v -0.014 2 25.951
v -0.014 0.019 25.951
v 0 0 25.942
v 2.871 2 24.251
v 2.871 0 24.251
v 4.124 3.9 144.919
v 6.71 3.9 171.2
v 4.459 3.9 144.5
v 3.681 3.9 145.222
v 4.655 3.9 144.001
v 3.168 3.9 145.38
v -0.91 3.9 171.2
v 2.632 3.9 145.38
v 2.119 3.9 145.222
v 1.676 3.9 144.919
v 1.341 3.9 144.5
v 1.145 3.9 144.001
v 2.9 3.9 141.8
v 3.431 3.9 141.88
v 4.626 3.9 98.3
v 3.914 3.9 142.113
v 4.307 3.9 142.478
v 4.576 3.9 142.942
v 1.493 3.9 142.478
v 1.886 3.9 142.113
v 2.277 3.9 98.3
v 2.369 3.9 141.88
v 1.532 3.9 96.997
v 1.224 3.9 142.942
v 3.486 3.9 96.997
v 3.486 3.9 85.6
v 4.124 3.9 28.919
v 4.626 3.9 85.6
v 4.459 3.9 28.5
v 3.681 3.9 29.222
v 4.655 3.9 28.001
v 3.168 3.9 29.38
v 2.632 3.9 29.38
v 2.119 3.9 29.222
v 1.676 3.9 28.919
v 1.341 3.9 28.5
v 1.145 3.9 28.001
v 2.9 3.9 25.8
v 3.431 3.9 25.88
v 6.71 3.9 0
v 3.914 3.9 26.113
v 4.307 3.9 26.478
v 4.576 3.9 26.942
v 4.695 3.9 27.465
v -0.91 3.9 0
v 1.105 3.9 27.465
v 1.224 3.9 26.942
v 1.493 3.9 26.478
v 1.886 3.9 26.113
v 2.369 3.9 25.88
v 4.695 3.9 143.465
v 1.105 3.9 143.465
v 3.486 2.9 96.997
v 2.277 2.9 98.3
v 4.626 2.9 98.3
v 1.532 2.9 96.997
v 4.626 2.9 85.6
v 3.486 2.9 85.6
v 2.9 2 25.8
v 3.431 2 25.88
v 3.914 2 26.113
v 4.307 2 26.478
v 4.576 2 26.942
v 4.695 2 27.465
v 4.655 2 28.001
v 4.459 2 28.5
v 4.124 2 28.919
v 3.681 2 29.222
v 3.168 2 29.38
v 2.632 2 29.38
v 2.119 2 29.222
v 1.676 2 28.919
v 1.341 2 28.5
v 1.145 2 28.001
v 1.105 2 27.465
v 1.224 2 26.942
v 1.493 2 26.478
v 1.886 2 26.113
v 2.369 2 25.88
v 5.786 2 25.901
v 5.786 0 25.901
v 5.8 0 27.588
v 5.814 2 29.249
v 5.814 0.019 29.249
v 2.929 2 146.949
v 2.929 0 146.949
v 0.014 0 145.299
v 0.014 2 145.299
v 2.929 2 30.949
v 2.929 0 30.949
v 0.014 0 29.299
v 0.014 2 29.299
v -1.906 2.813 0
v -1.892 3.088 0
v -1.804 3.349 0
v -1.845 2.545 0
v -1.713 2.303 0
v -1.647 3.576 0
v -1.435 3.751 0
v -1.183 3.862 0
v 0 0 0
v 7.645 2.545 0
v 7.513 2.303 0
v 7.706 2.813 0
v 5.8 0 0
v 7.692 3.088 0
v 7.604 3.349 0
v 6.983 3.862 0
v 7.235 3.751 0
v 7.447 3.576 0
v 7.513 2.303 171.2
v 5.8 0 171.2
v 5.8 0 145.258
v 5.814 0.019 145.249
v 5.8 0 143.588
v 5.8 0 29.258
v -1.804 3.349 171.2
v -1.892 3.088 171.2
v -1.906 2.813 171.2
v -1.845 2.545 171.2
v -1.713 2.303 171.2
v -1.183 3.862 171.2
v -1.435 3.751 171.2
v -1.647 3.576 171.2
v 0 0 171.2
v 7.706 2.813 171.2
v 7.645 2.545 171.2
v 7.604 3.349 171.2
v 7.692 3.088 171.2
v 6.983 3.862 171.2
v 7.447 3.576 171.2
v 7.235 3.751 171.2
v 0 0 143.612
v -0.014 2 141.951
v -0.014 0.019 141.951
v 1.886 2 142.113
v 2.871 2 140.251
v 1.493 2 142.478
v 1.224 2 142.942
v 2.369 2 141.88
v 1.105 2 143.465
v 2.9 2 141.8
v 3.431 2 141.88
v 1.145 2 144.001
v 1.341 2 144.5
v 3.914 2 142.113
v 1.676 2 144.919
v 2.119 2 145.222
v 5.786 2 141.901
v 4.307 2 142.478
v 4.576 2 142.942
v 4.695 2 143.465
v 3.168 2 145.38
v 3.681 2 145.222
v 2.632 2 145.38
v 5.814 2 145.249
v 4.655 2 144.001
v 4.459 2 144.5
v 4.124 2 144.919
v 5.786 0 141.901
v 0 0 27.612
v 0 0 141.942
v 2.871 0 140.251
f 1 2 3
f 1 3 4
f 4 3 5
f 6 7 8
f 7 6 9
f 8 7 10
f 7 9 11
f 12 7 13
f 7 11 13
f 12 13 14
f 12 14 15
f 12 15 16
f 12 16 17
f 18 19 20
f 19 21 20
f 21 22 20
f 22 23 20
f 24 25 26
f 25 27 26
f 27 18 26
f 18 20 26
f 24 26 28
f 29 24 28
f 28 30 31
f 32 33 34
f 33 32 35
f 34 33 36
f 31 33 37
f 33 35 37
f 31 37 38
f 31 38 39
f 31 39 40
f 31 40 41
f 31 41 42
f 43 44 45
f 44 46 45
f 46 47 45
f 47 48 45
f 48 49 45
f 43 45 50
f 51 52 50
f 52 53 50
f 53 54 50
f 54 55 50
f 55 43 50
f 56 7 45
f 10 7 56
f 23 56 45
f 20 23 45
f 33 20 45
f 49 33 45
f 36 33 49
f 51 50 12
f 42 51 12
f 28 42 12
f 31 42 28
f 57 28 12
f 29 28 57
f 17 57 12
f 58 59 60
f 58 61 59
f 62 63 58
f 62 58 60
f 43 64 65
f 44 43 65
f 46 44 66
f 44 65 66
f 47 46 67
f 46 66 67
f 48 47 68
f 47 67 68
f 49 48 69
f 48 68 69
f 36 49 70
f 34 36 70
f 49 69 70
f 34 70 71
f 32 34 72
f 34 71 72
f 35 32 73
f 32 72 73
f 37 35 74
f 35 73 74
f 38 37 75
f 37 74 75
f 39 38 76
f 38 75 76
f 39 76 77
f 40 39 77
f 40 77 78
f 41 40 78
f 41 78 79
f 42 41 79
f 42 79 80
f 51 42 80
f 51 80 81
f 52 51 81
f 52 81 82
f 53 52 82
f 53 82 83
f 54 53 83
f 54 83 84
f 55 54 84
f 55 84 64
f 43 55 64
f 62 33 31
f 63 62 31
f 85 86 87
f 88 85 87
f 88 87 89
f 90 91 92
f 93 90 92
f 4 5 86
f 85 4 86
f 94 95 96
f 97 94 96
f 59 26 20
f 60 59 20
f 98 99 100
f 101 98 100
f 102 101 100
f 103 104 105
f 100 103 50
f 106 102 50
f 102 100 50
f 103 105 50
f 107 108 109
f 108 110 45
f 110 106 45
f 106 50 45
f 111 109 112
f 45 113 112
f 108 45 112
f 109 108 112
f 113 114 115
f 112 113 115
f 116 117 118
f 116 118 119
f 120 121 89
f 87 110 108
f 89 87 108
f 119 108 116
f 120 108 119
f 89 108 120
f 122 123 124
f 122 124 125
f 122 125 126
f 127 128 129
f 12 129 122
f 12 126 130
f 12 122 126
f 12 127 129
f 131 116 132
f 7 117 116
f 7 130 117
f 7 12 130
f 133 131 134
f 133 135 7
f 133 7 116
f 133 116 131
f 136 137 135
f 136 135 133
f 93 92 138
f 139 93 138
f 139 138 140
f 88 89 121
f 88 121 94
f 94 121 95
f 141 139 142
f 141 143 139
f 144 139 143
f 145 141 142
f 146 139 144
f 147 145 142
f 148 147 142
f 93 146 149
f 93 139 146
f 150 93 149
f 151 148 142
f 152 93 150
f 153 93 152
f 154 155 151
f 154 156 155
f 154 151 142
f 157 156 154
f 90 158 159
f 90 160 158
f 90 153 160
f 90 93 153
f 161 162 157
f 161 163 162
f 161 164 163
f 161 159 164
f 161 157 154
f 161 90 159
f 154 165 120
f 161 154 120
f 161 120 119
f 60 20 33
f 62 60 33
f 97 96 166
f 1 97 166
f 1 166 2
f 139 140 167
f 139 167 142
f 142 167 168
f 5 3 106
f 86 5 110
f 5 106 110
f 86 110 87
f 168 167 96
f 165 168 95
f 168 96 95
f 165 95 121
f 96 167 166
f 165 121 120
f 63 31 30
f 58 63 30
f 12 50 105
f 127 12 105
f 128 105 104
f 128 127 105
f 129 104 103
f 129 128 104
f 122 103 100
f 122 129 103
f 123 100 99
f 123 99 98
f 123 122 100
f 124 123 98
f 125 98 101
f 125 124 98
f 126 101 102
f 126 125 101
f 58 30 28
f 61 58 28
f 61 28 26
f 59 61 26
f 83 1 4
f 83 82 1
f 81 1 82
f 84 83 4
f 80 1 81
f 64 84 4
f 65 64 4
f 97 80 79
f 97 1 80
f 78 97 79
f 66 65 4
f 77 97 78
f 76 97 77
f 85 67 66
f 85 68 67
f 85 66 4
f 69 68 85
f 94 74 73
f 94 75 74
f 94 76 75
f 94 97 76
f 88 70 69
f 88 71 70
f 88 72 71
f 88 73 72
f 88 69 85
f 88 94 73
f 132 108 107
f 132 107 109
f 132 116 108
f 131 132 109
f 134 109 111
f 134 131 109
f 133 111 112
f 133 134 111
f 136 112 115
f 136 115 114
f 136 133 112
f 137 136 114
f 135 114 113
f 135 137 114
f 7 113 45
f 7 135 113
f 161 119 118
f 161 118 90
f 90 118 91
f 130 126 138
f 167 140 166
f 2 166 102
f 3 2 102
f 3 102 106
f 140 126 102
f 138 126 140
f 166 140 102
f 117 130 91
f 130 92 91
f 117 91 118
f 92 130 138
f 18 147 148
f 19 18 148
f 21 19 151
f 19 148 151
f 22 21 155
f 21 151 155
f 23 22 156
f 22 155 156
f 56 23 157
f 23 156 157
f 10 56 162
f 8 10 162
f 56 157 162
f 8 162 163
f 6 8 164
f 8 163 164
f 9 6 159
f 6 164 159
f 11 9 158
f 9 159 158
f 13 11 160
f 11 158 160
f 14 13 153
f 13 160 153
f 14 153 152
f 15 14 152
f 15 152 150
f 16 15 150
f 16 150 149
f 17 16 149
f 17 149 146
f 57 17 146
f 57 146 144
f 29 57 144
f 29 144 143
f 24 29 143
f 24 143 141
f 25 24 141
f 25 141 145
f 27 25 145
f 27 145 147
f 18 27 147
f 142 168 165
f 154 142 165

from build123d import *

# Parameters (mm, degrees)
BOSS_EXTRUDE1_DEPTH = 171.2
FILLET1_R           = 1
SKETCH2_R           = 1.8
CUT_EXTRUDE1_DEPTH  = 200
CUT_EXTRUDE2_DEPTH  = 2
LPATTERN1_COUNT     = 3
LPATTERN1_PITCH     = 116
CUT_EXTRUDE3_DEPTH  = 1


with BuildPart() as part:
    # Sketch1 → Boss-Extrude1 (new body)
    with BuildSketch(Plane.XY):
        Polygon((0, 0), (5.8, 0), (8.7, 3.9), (-2.9, 3.9), align=None)
    extrude(amount=BOSS_EXTRUDE1_DEPTH)

    # Fillet1
    fillet1_edges = [part.edges().sort_by_distance(p)[0] for p in [
        (-2.9, 3.9, 85.6),
        (8.7, 3.9, 85.6),
    ]]
    fillet(fillet1_edges, radius=FILLET1_R)

    # Sketch2 → Cut-Extrude1 (cut)
    with BuildSketch(Plane.XZ):
        with Locations(Location((2.9, 143.6, 0), (0, 0, 270))):
            Circle(SKETCH2_R)
    cut_extrude1 = extrude(amount=-CUT_EXTRUDE1_DEPTH, mode=Mode.SUBTRACT)

    # Sketch3 → Cut-Extrude2 (cut)
    with BuildSketch(Plane.XZ):
        Polygon((2.92874321, 146.948508199), (0.01447844, 145.29914645), (-0.014264771, 141.950638251), (2.87125679, 140.251491801), (5.78552156, 141.90085355), (5.814264771, 145.249361749), align=None)
    cut_extrude2 = extrude(amount=-CUT_EXTRUDE2_DEPTH, mode=Mode.SUBTRACT)

    # LPattern1: Cut-Extrude1, Cut-Extrude2 ×3
    with Locations(*[(0, 0, -i * LPATTERN1_PITCH) for i in range(1, LPATTERN1_COUNT)]):
        add(cut_extrude1, mode=Mode.SUBTRACT)
        add(cut_extrude2, mode=Mode.SUBTRACT)

    # Sketch4 → Cut-Extrude3 (cut)
    with BuildSketch(Plane(origin=(0, 3.9, 0), x_dir=(1, 0, 0), z_dir=(0, 1, 0))):
        Polygon((2.277474494, -98.3), (4.625651577, -98.3), (4.625651577, -85.6), (3.485907988, -85.6), (3.485907988, -96.997435897), (1.532061834, -96.997435897), align=None)
    extrude(amount=-CUT_EXTRUDE3_DEPTH, mode=Mode.SUBTRACT)


solid = part.part
